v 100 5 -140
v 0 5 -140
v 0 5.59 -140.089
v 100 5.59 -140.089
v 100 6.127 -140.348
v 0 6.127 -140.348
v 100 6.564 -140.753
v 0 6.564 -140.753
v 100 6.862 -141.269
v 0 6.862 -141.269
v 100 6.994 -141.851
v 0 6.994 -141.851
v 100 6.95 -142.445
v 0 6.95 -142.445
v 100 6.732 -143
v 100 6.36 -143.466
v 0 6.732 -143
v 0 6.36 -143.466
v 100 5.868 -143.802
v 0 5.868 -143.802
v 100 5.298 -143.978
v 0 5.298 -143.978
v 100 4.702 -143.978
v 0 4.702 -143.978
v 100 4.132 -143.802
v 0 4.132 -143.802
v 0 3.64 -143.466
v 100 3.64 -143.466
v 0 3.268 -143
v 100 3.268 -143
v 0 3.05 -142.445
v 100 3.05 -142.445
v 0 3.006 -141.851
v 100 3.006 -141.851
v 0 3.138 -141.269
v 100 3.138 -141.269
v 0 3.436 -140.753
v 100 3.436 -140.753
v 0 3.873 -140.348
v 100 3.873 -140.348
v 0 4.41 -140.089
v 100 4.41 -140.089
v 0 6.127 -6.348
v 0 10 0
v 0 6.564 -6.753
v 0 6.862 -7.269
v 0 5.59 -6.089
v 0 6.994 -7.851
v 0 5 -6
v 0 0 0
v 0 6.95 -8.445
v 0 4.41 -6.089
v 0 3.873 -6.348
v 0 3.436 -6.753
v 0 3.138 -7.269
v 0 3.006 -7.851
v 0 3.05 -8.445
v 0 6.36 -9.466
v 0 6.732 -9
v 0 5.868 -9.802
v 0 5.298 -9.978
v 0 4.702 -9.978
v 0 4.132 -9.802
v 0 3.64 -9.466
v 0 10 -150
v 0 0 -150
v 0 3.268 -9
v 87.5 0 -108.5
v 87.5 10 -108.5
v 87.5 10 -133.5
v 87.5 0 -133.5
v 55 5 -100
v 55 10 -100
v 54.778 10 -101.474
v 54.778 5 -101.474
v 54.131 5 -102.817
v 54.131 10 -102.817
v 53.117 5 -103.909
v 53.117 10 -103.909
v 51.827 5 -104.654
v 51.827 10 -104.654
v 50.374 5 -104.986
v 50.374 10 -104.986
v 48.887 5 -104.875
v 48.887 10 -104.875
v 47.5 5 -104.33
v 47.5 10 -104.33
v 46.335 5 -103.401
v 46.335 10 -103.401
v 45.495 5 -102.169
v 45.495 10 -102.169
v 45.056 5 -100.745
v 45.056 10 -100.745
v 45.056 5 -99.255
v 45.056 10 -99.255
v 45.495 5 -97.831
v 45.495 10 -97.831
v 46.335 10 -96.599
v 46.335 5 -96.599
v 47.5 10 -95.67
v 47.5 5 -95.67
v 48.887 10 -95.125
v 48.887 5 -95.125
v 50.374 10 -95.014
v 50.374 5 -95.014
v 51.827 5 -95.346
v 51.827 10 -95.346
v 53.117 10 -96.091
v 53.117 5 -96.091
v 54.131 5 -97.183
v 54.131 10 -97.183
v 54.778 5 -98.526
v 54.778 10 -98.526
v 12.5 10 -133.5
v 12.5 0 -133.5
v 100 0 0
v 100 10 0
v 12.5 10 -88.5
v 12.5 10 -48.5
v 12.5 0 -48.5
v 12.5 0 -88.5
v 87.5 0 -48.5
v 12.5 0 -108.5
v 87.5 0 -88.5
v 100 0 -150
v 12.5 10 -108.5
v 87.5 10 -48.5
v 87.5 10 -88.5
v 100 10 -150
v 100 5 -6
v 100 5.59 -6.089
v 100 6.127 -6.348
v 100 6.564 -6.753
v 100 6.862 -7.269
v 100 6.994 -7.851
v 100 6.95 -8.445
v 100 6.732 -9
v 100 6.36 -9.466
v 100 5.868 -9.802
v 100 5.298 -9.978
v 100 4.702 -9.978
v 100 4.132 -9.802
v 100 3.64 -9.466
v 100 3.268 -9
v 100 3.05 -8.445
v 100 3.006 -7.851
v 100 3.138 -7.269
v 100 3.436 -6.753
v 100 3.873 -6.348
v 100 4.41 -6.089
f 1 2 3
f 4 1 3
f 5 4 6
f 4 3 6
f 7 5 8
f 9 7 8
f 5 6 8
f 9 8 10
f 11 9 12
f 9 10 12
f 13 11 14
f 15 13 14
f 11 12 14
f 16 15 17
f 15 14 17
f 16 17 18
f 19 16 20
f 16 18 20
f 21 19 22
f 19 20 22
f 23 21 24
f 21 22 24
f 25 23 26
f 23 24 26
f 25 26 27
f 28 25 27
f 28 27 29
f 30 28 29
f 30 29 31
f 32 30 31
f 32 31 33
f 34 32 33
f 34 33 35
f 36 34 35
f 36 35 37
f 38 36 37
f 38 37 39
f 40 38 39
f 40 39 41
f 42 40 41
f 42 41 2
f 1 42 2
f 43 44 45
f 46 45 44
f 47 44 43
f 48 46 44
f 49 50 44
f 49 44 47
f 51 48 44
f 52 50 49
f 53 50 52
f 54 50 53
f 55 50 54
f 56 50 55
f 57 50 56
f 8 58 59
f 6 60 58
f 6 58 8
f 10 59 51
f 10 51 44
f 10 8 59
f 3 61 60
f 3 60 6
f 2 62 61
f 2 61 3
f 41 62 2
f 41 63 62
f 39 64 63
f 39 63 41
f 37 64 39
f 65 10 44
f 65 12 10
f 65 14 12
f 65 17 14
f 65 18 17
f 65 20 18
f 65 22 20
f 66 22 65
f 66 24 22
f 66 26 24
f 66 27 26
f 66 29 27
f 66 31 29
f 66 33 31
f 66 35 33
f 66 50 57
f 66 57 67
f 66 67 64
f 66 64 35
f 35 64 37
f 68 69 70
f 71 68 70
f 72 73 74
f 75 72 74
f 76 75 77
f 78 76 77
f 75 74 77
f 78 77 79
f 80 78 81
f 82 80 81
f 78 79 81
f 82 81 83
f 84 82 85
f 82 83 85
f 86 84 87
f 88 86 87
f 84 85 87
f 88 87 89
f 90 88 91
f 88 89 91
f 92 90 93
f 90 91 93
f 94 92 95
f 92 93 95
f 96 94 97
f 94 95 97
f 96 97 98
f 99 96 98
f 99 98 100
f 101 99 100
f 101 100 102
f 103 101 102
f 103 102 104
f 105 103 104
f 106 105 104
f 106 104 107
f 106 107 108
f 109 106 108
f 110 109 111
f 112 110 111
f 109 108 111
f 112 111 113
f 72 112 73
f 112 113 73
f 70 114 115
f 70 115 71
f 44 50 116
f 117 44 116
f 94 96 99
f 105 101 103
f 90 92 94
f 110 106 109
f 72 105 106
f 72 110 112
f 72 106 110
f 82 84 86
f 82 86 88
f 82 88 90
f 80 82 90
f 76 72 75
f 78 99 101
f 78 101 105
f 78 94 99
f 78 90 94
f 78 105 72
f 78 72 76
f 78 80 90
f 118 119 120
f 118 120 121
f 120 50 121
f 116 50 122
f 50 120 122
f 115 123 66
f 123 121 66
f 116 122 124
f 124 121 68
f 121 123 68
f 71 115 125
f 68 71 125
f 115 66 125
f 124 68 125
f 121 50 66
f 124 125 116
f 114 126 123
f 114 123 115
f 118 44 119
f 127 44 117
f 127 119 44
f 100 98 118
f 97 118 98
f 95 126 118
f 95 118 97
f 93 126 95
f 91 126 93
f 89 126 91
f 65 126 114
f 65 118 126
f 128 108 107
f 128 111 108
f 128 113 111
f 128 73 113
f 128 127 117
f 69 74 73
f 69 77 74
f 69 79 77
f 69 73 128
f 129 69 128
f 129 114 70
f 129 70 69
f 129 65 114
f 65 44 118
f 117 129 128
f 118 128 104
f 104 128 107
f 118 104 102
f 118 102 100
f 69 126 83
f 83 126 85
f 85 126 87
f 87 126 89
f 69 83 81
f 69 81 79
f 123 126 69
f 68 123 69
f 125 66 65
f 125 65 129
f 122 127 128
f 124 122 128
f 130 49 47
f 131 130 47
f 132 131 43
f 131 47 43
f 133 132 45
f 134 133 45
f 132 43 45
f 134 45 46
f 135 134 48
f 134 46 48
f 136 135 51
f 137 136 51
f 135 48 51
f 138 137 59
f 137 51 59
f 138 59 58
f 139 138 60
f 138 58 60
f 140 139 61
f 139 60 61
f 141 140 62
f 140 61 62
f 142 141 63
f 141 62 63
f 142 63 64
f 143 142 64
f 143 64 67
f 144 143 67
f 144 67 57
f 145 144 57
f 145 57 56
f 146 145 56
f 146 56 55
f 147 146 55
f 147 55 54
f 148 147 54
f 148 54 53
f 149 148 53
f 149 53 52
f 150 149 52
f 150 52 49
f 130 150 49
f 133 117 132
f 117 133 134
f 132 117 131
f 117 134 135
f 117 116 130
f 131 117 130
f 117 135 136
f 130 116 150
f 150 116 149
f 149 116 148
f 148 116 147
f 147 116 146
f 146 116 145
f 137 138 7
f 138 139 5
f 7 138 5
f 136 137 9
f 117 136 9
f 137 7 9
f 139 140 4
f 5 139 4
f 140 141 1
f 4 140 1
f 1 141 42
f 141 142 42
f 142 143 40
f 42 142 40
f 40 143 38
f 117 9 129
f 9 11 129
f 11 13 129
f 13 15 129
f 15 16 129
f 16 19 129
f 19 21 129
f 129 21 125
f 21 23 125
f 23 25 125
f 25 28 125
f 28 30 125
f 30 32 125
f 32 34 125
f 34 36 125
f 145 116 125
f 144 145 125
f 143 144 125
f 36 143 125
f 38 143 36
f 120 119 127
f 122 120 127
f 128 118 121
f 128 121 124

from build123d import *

# Parameters (mm, degrees)
SKETCH2_W           = 100
SKETCH2_H           = 150
BOSS_EXTRUDE1_DEPTH = 10
SKETCH3_R           = 5
MOUNTHOLE_DEPTH     = 5
SKETCH4_R           = 2
CUT_EXTRUDE2_DEPTH  = 101
SKETCH5_R           = 2
CUT_EXTRUDE3_DEPTH  = 101
SKETCH14_W          = 75
SKETCH14_H          = 25
SKETCH14_H_2        = 40
CUT_EXTRUDE7_DEPTH  = 11


with BuildPart() as part:
    # Sketch2 → Boss-Extrude1 (new body)
    with BuildSketch(Plane(origin=(0, 0, 0), x_dir=(1, 0, 0), z_dir=(0, 1, 0))):
        with Locations((50, 75)):
            Rectangle(SKETCH2_W, SKETCH2_H)
    extrude(amount=BOSS_EXTRUDE1_DEPTH)

    # Sketch3 → MountHole (cut)
    with BuildSketch(Plane(origin=(0, 10, 0), x_dir=(1, 0, 0), z_dir=(0, 1, 0))):
        with Locations((50, 100)):
            Circle(SKETCH3_R)
    extrude(amount=-MOUNTHOLE_DEPTH, mode=Mode.SUBTRACT)

    # Sketch4 → Cut-Extrude2 (cut, through all)
    with BuildSketch(Plane.ZY):
        with Locations((-8, 5)):
            Circle(SKETCH4_R)
    extrude(amount=-CUT_EXTRUDE2_DEPTH, mode=Mode.SUBTRACT)

    # Sketch5 → Cut-Extrude3 (cut, through all)
    with BuildSketch(Plane.ZY):
        with Locations((-142, 5)):
            Circle(SKETCH5_R)
    extrude(amount=-CUT_EXTRUDE3_DEPTH, mode=Mode.SUBTRACT)

    # Sketch14 → Cut-Extrude7 (cut, through all)
    with BuildSketch(Plane(origin=(0, 10, 0), x_dir=(1, 0, 0), z_dir=(0, 1, 0))):
        with Locations((50, 121)):
            Rectangle(SKETCH14_W, SKETCH14_H)
        with Locations((50, 68.5)):
            Rectangle(SKETCH14_W, SKETCH14_H_2)
    extrude(amount=-CUT_EXTRUDE7_DEPTH, mode=Mode.SUBTRACT)


solid = part.part
